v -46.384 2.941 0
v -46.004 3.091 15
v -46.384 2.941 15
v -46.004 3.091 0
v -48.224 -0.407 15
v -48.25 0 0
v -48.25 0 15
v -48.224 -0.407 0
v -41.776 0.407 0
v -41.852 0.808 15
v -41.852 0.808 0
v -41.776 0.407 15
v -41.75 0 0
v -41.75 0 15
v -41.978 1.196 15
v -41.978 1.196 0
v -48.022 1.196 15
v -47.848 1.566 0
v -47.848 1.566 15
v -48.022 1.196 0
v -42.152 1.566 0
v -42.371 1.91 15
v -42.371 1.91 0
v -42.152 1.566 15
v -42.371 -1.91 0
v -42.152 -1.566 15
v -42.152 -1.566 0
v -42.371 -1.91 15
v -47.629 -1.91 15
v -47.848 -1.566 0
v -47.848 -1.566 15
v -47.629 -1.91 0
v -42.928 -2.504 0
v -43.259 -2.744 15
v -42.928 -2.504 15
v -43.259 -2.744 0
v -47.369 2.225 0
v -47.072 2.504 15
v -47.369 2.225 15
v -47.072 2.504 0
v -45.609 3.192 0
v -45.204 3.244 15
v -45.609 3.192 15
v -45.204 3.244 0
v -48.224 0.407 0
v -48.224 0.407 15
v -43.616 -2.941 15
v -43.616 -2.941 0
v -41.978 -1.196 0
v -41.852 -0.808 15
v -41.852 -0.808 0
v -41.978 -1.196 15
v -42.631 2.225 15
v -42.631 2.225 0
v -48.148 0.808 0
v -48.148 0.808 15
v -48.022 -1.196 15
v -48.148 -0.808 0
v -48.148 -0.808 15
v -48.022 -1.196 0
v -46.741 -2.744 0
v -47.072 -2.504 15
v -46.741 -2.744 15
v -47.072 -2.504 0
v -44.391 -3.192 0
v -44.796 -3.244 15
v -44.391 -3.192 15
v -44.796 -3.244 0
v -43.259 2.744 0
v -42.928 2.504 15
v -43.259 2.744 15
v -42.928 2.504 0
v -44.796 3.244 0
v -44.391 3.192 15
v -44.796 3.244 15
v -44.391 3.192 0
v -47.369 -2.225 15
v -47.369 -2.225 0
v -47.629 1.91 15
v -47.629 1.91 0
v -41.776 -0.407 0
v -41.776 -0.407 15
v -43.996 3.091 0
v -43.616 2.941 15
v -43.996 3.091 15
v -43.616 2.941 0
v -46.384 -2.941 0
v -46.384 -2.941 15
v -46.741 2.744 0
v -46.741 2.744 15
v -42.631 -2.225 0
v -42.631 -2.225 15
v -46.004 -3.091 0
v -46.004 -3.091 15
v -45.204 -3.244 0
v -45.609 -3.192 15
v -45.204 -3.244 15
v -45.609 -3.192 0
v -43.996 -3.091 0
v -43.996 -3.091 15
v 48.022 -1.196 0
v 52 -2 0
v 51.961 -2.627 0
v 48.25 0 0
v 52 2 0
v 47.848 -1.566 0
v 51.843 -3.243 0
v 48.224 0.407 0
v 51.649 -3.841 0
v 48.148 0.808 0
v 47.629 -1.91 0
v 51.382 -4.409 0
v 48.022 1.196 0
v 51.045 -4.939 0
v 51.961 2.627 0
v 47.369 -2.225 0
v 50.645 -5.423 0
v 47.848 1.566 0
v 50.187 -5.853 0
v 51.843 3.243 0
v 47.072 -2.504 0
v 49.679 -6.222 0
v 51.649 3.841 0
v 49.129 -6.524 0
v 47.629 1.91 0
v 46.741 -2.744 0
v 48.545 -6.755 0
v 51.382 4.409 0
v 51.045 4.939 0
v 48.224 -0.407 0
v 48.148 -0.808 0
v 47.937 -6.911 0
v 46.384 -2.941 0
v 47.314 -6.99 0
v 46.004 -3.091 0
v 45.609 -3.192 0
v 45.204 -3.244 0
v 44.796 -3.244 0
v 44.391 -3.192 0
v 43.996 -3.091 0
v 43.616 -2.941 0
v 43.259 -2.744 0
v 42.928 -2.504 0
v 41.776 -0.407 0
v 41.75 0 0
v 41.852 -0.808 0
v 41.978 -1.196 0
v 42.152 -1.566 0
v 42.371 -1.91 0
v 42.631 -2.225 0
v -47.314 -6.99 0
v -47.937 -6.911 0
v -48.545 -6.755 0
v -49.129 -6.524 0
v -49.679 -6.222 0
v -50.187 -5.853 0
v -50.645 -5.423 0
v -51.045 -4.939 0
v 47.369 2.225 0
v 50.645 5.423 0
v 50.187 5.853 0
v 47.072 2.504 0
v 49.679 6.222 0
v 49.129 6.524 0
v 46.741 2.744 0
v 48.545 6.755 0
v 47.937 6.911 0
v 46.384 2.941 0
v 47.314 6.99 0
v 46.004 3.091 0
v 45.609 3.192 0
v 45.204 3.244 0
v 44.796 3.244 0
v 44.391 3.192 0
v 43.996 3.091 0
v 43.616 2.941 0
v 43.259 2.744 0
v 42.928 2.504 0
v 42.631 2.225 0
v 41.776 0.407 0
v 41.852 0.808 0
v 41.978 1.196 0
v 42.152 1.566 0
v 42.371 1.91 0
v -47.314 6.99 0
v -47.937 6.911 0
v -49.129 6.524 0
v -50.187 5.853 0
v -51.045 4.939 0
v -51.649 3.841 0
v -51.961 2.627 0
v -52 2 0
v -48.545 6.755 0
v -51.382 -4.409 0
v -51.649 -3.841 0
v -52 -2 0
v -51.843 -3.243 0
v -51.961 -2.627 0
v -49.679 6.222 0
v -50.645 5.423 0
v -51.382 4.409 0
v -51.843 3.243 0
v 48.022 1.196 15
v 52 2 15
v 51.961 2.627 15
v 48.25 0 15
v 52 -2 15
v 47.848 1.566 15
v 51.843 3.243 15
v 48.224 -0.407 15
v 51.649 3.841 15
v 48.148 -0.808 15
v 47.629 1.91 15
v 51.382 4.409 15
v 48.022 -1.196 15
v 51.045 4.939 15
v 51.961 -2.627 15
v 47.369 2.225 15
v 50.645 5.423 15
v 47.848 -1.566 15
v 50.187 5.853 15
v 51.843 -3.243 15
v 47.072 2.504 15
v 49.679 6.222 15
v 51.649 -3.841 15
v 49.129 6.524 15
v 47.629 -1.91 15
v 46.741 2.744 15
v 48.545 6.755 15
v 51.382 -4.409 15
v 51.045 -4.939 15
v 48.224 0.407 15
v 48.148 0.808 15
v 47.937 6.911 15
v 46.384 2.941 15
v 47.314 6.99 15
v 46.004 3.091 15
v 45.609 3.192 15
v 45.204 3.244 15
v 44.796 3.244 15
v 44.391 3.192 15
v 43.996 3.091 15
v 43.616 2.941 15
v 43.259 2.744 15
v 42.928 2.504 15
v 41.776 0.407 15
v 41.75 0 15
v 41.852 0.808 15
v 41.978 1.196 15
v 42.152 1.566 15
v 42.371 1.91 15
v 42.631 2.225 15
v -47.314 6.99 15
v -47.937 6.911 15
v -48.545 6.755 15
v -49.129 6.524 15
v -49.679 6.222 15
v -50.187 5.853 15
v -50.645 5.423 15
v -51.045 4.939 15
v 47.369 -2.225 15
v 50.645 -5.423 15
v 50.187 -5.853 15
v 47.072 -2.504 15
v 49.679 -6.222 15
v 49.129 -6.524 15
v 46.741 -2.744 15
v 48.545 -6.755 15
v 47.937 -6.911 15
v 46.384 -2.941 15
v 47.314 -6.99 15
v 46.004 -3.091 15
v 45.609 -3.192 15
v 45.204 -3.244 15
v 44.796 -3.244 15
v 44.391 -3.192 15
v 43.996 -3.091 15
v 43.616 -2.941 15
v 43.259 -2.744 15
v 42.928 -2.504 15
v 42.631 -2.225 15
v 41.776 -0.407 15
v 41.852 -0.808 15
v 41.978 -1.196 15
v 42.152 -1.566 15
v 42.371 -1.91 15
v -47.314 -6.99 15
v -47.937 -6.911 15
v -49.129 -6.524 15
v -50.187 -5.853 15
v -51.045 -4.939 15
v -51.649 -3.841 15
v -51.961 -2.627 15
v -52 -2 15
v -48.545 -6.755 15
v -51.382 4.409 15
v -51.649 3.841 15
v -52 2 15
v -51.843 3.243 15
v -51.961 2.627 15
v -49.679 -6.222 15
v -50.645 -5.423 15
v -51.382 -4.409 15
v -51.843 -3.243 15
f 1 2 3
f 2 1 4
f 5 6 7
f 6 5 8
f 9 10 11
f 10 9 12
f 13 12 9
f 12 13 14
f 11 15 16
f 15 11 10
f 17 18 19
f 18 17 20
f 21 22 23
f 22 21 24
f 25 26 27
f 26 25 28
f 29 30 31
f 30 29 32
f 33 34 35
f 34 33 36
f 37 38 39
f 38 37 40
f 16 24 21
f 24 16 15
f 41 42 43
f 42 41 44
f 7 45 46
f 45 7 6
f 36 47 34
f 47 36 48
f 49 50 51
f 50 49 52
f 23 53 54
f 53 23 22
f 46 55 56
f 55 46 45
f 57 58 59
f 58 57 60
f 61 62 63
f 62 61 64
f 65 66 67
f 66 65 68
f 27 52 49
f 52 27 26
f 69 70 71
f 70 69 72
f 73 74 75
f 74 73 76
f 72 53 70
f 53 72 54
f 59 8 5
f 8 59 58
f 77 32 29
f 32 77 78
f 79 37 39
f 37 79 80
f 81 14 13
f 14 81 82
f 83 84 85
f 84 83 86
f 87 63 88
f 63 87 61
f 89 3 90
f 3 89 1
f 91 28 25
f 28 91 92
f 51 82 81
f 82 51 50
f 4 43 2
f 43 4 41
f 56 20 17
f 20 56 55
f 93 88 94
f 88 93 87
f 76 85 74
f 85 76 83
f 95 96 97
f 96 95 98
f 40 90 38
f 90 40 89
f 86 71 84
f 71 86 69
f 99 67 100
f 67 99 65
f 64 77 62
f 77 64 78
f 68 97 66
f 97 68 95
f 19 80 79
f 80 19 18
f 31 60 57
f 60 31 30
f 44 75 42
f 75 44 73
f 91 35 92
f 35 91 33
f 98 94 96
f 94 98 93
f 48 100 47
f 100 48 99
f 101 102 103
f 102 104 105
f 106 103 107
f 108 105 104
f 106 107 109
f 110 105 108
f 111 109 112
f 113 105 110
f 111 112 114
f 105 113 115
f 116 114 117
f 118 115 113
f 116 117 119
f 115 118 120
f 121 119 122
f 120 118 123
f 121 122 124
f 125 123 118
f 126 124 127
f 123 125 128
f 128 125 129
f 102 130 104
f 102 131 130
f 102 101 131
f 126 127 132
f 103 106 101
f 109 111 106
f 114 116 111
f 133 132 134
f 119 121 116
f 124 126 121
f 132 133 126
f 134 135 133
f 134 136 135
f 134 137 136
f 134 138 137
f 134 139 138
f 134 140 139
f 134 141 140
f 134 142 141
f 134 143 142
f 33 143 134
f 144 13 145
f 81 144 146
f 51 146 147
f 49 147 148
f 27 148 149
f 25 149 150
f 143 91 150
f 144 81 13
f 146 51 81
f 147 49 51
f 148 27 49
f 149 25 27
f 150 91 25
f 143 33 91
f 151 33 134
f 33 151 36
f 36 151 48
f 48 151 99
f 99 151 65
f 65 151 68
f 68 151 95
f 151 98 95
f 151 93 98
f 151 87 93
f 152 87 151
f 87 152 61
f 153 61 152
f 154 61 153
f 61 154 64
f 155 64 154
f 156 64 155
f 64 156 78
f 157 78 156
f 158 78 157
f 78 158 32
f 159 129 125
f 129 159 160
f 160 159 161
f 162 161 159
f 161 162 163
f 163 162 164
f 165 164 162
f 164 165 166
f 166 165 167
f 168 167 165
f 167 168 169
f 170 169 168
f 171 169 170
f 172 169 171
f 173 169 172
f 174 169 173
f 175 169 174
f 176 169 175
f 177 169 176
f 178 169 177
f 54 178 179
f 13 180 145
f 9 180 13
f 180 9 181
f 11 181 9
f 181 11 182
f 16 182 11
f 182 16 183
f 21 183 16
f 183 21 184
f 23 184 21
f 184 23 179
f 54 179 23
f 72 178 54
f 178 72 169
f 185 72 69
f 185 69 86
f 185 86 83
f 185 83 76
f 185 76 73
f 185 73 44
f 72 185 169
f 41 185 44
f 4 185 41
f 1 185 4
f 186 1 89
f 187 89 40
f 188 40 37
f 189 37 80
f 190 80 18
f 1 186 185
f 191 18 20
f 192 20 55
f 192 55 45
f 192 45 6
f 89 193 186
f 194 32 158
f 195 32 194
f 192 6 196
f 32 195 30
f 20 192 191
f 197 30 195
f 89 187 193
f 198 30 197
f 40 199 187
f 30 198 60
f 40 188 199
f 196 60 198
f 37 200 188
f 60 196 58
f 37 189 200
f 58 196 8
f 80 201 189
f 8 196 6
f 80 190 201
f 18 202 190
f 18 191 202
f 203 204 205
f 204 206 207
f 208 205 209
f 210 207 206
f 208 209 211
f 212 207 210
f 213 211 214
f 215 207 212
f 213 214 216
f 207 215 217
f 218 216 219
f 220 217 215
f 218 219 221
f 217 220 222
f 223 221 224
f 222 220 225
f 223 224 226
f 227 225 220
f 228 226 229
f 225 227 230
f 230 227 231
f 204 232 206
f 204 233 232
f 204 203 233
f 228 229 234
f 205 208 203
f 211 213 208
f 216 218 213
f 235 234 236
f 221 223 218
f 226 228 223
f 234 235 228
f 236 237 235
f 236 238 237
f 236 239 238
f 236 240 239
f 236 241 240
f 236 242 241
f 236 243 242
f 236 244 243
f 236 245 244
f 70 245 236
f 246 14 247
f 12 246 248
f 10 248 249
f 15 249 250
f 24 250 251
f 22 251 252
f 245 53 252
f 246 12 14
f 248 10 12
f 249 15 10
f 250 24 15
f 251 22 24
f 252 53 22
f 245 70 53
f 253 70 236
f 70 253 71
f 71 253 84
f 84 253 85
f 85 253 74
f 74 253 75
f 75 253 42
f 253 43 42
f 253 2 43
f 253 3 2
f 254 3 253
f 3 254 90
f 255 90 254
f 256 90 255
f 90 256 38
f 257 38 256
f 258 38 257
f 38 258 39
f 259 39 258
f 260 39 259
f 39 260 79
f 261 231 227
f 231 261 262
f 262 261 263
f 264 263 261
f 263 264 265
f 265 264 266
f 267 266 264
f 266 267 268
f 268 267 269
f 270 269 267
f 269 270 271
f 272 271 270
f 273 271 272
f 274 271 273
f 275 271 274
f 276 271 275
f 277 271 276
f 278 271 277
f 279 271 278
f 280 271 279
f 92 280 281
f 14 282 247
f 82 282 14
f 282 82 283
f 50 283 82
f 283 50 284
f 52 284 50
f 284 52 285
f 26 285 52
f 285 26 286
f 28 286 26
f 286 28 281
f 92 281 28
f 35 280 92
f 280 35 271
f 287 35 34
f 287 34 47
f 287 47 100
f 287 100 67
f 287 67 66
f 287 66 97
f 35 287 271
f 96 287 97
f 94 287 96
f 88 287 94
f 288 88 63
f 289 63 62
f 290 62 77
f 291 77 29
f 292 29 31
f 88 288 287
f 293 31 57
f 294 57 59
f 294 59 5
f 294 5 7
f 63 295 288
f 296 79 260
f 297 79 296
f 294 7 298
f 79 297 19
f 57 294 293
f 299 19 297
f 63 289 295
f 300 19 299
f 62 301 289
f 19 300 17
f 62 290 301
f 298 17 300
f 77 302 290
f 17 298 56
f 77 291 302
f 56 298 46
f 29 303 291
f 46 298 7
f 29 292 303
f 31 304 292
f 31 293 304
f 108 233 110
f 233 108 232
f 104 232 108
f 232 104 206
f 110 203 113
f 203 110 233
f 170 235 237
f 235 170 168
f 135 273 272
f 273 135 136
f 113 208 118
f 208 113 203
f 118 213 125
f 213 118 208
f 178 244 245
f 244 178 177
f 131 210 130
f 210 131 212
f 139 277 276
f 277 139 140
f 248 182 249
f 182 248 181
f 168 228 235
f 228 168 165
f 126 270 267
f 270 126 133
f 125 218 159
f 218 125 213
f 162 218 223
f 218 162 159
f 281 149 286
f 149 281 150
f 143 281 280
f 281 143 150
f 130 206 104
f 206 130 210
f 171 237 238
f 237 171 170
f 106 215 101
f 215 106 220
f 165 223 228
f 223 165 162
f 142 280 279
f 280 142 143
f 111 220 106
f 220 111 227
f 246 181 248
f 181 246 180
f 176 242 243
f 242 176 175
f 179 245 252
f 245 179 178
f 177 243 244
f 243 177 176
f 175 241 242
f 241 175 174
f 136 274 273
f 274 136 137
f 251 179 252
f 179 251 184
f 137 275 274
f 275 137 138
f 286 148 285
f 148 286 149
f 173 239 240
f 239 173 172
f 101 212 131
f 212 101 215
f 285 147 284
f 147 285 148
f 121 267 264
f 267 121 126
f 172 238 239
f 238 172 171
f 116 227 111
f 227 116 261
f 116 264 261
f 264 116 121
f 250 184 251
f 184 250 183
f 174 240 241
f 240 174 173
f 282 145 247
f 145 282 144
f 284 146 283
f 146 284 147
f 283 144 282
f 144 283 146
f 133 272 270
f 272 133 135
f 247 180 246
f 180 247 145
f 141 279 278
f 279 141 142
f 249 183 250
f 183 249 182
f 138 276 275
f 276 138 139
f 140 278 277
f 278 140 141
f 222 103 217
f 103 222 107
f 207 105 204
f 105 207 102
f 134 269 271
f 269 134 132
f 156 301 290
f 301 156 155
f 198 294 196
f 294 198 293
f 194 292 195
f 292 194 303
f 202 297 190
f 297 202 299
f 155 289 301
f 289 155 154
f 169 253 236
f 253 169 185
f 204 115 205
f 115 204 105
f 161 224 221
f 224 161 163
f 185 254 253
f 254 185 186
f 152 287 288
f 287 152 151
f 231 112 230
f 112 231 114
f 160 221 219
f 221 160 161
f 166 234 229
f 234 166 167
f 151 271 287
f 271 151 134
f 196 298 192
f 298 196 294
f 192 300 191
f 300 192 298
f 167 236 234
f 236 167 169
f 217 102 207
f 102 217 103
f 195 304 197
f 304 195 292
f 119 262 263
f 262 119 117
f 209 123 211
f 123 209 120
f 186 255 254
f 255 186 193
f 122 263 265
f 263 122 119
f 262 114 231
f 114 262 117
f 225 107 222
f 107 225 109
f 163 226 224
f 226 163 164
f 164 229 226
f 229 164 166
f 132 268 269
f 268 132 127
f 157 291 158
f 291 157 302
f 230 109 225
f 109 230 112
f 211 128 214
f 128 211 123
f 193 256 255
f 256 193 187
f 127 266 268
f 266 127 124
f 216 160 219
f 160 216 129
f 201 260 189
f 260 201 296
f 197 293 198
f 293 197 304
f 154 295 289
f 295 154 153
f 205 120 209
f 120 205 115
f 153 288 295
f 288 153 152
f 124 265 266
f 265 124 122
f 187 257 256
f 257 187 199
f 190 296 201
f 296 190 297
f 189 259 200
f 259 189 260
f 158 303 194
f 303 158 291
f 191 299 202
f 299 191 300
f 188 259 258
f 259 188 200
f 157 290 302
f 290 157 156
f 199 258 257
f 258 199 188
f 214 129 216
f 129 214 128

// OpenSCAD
$fn = 50;


difference() {
	union() {
		hull() {
			translate(v = [-47.0000000000, 2.0000000000, 0]) {
				cylinder(h = 15, r = 5);
			}
			translate(v = [47.0000000000, 2.0000000000, 0]) {
				cylinder(h = 15, r = 5);
			}
			translate(v = [-47.0000000000, -2.0000000000, 0]) {
				cylinder(h = 15, r = 5);
			}
			translate(v = [47.0000000000, -2.0000000000, 0]) {
				cylinder(h = 15, r = 5);
			}
		}
	}
	union() {
		translate(v = [-45.0000000000, 0.0000000000, 0]) {
			cylinder(h = 15, r = 3.2500000000);
		}
		translate(v = [45.0000000000, 0.0000000000, 0]) {
			cylinder(h = 15, r = 3.2500000000);
		}
		translate(v = [-45.0000000000, 0.0000000000, 0]) {
			cylinder(h = 15, r = 1.8000000000);
		}
		translate(v = [45.0000000000, 0.0000000000, 0]) {
			cylinder(h = 15, r = 1.8000000000);
		}
		translate(v = [-45.0000000000, 0.0000000000, 0]) {
			cylinder(h = 15, r = 1.8000000000);
		}
		translate(v = [45.0000000000, 0.0000000000, 0]) {
			cylinder(h = 15, r = 1.8000000000);
		}
		translate(v = [-45.0000000000, 0.0000000000, 0]) {
			cylinder(h = 15, r = 1.8000000000);
		}
		translate(v = [45.0000000000, 0.0000000000, 0]) {
			cylinder(h = 15, r = 1.8000000000);
		}
	}
}
